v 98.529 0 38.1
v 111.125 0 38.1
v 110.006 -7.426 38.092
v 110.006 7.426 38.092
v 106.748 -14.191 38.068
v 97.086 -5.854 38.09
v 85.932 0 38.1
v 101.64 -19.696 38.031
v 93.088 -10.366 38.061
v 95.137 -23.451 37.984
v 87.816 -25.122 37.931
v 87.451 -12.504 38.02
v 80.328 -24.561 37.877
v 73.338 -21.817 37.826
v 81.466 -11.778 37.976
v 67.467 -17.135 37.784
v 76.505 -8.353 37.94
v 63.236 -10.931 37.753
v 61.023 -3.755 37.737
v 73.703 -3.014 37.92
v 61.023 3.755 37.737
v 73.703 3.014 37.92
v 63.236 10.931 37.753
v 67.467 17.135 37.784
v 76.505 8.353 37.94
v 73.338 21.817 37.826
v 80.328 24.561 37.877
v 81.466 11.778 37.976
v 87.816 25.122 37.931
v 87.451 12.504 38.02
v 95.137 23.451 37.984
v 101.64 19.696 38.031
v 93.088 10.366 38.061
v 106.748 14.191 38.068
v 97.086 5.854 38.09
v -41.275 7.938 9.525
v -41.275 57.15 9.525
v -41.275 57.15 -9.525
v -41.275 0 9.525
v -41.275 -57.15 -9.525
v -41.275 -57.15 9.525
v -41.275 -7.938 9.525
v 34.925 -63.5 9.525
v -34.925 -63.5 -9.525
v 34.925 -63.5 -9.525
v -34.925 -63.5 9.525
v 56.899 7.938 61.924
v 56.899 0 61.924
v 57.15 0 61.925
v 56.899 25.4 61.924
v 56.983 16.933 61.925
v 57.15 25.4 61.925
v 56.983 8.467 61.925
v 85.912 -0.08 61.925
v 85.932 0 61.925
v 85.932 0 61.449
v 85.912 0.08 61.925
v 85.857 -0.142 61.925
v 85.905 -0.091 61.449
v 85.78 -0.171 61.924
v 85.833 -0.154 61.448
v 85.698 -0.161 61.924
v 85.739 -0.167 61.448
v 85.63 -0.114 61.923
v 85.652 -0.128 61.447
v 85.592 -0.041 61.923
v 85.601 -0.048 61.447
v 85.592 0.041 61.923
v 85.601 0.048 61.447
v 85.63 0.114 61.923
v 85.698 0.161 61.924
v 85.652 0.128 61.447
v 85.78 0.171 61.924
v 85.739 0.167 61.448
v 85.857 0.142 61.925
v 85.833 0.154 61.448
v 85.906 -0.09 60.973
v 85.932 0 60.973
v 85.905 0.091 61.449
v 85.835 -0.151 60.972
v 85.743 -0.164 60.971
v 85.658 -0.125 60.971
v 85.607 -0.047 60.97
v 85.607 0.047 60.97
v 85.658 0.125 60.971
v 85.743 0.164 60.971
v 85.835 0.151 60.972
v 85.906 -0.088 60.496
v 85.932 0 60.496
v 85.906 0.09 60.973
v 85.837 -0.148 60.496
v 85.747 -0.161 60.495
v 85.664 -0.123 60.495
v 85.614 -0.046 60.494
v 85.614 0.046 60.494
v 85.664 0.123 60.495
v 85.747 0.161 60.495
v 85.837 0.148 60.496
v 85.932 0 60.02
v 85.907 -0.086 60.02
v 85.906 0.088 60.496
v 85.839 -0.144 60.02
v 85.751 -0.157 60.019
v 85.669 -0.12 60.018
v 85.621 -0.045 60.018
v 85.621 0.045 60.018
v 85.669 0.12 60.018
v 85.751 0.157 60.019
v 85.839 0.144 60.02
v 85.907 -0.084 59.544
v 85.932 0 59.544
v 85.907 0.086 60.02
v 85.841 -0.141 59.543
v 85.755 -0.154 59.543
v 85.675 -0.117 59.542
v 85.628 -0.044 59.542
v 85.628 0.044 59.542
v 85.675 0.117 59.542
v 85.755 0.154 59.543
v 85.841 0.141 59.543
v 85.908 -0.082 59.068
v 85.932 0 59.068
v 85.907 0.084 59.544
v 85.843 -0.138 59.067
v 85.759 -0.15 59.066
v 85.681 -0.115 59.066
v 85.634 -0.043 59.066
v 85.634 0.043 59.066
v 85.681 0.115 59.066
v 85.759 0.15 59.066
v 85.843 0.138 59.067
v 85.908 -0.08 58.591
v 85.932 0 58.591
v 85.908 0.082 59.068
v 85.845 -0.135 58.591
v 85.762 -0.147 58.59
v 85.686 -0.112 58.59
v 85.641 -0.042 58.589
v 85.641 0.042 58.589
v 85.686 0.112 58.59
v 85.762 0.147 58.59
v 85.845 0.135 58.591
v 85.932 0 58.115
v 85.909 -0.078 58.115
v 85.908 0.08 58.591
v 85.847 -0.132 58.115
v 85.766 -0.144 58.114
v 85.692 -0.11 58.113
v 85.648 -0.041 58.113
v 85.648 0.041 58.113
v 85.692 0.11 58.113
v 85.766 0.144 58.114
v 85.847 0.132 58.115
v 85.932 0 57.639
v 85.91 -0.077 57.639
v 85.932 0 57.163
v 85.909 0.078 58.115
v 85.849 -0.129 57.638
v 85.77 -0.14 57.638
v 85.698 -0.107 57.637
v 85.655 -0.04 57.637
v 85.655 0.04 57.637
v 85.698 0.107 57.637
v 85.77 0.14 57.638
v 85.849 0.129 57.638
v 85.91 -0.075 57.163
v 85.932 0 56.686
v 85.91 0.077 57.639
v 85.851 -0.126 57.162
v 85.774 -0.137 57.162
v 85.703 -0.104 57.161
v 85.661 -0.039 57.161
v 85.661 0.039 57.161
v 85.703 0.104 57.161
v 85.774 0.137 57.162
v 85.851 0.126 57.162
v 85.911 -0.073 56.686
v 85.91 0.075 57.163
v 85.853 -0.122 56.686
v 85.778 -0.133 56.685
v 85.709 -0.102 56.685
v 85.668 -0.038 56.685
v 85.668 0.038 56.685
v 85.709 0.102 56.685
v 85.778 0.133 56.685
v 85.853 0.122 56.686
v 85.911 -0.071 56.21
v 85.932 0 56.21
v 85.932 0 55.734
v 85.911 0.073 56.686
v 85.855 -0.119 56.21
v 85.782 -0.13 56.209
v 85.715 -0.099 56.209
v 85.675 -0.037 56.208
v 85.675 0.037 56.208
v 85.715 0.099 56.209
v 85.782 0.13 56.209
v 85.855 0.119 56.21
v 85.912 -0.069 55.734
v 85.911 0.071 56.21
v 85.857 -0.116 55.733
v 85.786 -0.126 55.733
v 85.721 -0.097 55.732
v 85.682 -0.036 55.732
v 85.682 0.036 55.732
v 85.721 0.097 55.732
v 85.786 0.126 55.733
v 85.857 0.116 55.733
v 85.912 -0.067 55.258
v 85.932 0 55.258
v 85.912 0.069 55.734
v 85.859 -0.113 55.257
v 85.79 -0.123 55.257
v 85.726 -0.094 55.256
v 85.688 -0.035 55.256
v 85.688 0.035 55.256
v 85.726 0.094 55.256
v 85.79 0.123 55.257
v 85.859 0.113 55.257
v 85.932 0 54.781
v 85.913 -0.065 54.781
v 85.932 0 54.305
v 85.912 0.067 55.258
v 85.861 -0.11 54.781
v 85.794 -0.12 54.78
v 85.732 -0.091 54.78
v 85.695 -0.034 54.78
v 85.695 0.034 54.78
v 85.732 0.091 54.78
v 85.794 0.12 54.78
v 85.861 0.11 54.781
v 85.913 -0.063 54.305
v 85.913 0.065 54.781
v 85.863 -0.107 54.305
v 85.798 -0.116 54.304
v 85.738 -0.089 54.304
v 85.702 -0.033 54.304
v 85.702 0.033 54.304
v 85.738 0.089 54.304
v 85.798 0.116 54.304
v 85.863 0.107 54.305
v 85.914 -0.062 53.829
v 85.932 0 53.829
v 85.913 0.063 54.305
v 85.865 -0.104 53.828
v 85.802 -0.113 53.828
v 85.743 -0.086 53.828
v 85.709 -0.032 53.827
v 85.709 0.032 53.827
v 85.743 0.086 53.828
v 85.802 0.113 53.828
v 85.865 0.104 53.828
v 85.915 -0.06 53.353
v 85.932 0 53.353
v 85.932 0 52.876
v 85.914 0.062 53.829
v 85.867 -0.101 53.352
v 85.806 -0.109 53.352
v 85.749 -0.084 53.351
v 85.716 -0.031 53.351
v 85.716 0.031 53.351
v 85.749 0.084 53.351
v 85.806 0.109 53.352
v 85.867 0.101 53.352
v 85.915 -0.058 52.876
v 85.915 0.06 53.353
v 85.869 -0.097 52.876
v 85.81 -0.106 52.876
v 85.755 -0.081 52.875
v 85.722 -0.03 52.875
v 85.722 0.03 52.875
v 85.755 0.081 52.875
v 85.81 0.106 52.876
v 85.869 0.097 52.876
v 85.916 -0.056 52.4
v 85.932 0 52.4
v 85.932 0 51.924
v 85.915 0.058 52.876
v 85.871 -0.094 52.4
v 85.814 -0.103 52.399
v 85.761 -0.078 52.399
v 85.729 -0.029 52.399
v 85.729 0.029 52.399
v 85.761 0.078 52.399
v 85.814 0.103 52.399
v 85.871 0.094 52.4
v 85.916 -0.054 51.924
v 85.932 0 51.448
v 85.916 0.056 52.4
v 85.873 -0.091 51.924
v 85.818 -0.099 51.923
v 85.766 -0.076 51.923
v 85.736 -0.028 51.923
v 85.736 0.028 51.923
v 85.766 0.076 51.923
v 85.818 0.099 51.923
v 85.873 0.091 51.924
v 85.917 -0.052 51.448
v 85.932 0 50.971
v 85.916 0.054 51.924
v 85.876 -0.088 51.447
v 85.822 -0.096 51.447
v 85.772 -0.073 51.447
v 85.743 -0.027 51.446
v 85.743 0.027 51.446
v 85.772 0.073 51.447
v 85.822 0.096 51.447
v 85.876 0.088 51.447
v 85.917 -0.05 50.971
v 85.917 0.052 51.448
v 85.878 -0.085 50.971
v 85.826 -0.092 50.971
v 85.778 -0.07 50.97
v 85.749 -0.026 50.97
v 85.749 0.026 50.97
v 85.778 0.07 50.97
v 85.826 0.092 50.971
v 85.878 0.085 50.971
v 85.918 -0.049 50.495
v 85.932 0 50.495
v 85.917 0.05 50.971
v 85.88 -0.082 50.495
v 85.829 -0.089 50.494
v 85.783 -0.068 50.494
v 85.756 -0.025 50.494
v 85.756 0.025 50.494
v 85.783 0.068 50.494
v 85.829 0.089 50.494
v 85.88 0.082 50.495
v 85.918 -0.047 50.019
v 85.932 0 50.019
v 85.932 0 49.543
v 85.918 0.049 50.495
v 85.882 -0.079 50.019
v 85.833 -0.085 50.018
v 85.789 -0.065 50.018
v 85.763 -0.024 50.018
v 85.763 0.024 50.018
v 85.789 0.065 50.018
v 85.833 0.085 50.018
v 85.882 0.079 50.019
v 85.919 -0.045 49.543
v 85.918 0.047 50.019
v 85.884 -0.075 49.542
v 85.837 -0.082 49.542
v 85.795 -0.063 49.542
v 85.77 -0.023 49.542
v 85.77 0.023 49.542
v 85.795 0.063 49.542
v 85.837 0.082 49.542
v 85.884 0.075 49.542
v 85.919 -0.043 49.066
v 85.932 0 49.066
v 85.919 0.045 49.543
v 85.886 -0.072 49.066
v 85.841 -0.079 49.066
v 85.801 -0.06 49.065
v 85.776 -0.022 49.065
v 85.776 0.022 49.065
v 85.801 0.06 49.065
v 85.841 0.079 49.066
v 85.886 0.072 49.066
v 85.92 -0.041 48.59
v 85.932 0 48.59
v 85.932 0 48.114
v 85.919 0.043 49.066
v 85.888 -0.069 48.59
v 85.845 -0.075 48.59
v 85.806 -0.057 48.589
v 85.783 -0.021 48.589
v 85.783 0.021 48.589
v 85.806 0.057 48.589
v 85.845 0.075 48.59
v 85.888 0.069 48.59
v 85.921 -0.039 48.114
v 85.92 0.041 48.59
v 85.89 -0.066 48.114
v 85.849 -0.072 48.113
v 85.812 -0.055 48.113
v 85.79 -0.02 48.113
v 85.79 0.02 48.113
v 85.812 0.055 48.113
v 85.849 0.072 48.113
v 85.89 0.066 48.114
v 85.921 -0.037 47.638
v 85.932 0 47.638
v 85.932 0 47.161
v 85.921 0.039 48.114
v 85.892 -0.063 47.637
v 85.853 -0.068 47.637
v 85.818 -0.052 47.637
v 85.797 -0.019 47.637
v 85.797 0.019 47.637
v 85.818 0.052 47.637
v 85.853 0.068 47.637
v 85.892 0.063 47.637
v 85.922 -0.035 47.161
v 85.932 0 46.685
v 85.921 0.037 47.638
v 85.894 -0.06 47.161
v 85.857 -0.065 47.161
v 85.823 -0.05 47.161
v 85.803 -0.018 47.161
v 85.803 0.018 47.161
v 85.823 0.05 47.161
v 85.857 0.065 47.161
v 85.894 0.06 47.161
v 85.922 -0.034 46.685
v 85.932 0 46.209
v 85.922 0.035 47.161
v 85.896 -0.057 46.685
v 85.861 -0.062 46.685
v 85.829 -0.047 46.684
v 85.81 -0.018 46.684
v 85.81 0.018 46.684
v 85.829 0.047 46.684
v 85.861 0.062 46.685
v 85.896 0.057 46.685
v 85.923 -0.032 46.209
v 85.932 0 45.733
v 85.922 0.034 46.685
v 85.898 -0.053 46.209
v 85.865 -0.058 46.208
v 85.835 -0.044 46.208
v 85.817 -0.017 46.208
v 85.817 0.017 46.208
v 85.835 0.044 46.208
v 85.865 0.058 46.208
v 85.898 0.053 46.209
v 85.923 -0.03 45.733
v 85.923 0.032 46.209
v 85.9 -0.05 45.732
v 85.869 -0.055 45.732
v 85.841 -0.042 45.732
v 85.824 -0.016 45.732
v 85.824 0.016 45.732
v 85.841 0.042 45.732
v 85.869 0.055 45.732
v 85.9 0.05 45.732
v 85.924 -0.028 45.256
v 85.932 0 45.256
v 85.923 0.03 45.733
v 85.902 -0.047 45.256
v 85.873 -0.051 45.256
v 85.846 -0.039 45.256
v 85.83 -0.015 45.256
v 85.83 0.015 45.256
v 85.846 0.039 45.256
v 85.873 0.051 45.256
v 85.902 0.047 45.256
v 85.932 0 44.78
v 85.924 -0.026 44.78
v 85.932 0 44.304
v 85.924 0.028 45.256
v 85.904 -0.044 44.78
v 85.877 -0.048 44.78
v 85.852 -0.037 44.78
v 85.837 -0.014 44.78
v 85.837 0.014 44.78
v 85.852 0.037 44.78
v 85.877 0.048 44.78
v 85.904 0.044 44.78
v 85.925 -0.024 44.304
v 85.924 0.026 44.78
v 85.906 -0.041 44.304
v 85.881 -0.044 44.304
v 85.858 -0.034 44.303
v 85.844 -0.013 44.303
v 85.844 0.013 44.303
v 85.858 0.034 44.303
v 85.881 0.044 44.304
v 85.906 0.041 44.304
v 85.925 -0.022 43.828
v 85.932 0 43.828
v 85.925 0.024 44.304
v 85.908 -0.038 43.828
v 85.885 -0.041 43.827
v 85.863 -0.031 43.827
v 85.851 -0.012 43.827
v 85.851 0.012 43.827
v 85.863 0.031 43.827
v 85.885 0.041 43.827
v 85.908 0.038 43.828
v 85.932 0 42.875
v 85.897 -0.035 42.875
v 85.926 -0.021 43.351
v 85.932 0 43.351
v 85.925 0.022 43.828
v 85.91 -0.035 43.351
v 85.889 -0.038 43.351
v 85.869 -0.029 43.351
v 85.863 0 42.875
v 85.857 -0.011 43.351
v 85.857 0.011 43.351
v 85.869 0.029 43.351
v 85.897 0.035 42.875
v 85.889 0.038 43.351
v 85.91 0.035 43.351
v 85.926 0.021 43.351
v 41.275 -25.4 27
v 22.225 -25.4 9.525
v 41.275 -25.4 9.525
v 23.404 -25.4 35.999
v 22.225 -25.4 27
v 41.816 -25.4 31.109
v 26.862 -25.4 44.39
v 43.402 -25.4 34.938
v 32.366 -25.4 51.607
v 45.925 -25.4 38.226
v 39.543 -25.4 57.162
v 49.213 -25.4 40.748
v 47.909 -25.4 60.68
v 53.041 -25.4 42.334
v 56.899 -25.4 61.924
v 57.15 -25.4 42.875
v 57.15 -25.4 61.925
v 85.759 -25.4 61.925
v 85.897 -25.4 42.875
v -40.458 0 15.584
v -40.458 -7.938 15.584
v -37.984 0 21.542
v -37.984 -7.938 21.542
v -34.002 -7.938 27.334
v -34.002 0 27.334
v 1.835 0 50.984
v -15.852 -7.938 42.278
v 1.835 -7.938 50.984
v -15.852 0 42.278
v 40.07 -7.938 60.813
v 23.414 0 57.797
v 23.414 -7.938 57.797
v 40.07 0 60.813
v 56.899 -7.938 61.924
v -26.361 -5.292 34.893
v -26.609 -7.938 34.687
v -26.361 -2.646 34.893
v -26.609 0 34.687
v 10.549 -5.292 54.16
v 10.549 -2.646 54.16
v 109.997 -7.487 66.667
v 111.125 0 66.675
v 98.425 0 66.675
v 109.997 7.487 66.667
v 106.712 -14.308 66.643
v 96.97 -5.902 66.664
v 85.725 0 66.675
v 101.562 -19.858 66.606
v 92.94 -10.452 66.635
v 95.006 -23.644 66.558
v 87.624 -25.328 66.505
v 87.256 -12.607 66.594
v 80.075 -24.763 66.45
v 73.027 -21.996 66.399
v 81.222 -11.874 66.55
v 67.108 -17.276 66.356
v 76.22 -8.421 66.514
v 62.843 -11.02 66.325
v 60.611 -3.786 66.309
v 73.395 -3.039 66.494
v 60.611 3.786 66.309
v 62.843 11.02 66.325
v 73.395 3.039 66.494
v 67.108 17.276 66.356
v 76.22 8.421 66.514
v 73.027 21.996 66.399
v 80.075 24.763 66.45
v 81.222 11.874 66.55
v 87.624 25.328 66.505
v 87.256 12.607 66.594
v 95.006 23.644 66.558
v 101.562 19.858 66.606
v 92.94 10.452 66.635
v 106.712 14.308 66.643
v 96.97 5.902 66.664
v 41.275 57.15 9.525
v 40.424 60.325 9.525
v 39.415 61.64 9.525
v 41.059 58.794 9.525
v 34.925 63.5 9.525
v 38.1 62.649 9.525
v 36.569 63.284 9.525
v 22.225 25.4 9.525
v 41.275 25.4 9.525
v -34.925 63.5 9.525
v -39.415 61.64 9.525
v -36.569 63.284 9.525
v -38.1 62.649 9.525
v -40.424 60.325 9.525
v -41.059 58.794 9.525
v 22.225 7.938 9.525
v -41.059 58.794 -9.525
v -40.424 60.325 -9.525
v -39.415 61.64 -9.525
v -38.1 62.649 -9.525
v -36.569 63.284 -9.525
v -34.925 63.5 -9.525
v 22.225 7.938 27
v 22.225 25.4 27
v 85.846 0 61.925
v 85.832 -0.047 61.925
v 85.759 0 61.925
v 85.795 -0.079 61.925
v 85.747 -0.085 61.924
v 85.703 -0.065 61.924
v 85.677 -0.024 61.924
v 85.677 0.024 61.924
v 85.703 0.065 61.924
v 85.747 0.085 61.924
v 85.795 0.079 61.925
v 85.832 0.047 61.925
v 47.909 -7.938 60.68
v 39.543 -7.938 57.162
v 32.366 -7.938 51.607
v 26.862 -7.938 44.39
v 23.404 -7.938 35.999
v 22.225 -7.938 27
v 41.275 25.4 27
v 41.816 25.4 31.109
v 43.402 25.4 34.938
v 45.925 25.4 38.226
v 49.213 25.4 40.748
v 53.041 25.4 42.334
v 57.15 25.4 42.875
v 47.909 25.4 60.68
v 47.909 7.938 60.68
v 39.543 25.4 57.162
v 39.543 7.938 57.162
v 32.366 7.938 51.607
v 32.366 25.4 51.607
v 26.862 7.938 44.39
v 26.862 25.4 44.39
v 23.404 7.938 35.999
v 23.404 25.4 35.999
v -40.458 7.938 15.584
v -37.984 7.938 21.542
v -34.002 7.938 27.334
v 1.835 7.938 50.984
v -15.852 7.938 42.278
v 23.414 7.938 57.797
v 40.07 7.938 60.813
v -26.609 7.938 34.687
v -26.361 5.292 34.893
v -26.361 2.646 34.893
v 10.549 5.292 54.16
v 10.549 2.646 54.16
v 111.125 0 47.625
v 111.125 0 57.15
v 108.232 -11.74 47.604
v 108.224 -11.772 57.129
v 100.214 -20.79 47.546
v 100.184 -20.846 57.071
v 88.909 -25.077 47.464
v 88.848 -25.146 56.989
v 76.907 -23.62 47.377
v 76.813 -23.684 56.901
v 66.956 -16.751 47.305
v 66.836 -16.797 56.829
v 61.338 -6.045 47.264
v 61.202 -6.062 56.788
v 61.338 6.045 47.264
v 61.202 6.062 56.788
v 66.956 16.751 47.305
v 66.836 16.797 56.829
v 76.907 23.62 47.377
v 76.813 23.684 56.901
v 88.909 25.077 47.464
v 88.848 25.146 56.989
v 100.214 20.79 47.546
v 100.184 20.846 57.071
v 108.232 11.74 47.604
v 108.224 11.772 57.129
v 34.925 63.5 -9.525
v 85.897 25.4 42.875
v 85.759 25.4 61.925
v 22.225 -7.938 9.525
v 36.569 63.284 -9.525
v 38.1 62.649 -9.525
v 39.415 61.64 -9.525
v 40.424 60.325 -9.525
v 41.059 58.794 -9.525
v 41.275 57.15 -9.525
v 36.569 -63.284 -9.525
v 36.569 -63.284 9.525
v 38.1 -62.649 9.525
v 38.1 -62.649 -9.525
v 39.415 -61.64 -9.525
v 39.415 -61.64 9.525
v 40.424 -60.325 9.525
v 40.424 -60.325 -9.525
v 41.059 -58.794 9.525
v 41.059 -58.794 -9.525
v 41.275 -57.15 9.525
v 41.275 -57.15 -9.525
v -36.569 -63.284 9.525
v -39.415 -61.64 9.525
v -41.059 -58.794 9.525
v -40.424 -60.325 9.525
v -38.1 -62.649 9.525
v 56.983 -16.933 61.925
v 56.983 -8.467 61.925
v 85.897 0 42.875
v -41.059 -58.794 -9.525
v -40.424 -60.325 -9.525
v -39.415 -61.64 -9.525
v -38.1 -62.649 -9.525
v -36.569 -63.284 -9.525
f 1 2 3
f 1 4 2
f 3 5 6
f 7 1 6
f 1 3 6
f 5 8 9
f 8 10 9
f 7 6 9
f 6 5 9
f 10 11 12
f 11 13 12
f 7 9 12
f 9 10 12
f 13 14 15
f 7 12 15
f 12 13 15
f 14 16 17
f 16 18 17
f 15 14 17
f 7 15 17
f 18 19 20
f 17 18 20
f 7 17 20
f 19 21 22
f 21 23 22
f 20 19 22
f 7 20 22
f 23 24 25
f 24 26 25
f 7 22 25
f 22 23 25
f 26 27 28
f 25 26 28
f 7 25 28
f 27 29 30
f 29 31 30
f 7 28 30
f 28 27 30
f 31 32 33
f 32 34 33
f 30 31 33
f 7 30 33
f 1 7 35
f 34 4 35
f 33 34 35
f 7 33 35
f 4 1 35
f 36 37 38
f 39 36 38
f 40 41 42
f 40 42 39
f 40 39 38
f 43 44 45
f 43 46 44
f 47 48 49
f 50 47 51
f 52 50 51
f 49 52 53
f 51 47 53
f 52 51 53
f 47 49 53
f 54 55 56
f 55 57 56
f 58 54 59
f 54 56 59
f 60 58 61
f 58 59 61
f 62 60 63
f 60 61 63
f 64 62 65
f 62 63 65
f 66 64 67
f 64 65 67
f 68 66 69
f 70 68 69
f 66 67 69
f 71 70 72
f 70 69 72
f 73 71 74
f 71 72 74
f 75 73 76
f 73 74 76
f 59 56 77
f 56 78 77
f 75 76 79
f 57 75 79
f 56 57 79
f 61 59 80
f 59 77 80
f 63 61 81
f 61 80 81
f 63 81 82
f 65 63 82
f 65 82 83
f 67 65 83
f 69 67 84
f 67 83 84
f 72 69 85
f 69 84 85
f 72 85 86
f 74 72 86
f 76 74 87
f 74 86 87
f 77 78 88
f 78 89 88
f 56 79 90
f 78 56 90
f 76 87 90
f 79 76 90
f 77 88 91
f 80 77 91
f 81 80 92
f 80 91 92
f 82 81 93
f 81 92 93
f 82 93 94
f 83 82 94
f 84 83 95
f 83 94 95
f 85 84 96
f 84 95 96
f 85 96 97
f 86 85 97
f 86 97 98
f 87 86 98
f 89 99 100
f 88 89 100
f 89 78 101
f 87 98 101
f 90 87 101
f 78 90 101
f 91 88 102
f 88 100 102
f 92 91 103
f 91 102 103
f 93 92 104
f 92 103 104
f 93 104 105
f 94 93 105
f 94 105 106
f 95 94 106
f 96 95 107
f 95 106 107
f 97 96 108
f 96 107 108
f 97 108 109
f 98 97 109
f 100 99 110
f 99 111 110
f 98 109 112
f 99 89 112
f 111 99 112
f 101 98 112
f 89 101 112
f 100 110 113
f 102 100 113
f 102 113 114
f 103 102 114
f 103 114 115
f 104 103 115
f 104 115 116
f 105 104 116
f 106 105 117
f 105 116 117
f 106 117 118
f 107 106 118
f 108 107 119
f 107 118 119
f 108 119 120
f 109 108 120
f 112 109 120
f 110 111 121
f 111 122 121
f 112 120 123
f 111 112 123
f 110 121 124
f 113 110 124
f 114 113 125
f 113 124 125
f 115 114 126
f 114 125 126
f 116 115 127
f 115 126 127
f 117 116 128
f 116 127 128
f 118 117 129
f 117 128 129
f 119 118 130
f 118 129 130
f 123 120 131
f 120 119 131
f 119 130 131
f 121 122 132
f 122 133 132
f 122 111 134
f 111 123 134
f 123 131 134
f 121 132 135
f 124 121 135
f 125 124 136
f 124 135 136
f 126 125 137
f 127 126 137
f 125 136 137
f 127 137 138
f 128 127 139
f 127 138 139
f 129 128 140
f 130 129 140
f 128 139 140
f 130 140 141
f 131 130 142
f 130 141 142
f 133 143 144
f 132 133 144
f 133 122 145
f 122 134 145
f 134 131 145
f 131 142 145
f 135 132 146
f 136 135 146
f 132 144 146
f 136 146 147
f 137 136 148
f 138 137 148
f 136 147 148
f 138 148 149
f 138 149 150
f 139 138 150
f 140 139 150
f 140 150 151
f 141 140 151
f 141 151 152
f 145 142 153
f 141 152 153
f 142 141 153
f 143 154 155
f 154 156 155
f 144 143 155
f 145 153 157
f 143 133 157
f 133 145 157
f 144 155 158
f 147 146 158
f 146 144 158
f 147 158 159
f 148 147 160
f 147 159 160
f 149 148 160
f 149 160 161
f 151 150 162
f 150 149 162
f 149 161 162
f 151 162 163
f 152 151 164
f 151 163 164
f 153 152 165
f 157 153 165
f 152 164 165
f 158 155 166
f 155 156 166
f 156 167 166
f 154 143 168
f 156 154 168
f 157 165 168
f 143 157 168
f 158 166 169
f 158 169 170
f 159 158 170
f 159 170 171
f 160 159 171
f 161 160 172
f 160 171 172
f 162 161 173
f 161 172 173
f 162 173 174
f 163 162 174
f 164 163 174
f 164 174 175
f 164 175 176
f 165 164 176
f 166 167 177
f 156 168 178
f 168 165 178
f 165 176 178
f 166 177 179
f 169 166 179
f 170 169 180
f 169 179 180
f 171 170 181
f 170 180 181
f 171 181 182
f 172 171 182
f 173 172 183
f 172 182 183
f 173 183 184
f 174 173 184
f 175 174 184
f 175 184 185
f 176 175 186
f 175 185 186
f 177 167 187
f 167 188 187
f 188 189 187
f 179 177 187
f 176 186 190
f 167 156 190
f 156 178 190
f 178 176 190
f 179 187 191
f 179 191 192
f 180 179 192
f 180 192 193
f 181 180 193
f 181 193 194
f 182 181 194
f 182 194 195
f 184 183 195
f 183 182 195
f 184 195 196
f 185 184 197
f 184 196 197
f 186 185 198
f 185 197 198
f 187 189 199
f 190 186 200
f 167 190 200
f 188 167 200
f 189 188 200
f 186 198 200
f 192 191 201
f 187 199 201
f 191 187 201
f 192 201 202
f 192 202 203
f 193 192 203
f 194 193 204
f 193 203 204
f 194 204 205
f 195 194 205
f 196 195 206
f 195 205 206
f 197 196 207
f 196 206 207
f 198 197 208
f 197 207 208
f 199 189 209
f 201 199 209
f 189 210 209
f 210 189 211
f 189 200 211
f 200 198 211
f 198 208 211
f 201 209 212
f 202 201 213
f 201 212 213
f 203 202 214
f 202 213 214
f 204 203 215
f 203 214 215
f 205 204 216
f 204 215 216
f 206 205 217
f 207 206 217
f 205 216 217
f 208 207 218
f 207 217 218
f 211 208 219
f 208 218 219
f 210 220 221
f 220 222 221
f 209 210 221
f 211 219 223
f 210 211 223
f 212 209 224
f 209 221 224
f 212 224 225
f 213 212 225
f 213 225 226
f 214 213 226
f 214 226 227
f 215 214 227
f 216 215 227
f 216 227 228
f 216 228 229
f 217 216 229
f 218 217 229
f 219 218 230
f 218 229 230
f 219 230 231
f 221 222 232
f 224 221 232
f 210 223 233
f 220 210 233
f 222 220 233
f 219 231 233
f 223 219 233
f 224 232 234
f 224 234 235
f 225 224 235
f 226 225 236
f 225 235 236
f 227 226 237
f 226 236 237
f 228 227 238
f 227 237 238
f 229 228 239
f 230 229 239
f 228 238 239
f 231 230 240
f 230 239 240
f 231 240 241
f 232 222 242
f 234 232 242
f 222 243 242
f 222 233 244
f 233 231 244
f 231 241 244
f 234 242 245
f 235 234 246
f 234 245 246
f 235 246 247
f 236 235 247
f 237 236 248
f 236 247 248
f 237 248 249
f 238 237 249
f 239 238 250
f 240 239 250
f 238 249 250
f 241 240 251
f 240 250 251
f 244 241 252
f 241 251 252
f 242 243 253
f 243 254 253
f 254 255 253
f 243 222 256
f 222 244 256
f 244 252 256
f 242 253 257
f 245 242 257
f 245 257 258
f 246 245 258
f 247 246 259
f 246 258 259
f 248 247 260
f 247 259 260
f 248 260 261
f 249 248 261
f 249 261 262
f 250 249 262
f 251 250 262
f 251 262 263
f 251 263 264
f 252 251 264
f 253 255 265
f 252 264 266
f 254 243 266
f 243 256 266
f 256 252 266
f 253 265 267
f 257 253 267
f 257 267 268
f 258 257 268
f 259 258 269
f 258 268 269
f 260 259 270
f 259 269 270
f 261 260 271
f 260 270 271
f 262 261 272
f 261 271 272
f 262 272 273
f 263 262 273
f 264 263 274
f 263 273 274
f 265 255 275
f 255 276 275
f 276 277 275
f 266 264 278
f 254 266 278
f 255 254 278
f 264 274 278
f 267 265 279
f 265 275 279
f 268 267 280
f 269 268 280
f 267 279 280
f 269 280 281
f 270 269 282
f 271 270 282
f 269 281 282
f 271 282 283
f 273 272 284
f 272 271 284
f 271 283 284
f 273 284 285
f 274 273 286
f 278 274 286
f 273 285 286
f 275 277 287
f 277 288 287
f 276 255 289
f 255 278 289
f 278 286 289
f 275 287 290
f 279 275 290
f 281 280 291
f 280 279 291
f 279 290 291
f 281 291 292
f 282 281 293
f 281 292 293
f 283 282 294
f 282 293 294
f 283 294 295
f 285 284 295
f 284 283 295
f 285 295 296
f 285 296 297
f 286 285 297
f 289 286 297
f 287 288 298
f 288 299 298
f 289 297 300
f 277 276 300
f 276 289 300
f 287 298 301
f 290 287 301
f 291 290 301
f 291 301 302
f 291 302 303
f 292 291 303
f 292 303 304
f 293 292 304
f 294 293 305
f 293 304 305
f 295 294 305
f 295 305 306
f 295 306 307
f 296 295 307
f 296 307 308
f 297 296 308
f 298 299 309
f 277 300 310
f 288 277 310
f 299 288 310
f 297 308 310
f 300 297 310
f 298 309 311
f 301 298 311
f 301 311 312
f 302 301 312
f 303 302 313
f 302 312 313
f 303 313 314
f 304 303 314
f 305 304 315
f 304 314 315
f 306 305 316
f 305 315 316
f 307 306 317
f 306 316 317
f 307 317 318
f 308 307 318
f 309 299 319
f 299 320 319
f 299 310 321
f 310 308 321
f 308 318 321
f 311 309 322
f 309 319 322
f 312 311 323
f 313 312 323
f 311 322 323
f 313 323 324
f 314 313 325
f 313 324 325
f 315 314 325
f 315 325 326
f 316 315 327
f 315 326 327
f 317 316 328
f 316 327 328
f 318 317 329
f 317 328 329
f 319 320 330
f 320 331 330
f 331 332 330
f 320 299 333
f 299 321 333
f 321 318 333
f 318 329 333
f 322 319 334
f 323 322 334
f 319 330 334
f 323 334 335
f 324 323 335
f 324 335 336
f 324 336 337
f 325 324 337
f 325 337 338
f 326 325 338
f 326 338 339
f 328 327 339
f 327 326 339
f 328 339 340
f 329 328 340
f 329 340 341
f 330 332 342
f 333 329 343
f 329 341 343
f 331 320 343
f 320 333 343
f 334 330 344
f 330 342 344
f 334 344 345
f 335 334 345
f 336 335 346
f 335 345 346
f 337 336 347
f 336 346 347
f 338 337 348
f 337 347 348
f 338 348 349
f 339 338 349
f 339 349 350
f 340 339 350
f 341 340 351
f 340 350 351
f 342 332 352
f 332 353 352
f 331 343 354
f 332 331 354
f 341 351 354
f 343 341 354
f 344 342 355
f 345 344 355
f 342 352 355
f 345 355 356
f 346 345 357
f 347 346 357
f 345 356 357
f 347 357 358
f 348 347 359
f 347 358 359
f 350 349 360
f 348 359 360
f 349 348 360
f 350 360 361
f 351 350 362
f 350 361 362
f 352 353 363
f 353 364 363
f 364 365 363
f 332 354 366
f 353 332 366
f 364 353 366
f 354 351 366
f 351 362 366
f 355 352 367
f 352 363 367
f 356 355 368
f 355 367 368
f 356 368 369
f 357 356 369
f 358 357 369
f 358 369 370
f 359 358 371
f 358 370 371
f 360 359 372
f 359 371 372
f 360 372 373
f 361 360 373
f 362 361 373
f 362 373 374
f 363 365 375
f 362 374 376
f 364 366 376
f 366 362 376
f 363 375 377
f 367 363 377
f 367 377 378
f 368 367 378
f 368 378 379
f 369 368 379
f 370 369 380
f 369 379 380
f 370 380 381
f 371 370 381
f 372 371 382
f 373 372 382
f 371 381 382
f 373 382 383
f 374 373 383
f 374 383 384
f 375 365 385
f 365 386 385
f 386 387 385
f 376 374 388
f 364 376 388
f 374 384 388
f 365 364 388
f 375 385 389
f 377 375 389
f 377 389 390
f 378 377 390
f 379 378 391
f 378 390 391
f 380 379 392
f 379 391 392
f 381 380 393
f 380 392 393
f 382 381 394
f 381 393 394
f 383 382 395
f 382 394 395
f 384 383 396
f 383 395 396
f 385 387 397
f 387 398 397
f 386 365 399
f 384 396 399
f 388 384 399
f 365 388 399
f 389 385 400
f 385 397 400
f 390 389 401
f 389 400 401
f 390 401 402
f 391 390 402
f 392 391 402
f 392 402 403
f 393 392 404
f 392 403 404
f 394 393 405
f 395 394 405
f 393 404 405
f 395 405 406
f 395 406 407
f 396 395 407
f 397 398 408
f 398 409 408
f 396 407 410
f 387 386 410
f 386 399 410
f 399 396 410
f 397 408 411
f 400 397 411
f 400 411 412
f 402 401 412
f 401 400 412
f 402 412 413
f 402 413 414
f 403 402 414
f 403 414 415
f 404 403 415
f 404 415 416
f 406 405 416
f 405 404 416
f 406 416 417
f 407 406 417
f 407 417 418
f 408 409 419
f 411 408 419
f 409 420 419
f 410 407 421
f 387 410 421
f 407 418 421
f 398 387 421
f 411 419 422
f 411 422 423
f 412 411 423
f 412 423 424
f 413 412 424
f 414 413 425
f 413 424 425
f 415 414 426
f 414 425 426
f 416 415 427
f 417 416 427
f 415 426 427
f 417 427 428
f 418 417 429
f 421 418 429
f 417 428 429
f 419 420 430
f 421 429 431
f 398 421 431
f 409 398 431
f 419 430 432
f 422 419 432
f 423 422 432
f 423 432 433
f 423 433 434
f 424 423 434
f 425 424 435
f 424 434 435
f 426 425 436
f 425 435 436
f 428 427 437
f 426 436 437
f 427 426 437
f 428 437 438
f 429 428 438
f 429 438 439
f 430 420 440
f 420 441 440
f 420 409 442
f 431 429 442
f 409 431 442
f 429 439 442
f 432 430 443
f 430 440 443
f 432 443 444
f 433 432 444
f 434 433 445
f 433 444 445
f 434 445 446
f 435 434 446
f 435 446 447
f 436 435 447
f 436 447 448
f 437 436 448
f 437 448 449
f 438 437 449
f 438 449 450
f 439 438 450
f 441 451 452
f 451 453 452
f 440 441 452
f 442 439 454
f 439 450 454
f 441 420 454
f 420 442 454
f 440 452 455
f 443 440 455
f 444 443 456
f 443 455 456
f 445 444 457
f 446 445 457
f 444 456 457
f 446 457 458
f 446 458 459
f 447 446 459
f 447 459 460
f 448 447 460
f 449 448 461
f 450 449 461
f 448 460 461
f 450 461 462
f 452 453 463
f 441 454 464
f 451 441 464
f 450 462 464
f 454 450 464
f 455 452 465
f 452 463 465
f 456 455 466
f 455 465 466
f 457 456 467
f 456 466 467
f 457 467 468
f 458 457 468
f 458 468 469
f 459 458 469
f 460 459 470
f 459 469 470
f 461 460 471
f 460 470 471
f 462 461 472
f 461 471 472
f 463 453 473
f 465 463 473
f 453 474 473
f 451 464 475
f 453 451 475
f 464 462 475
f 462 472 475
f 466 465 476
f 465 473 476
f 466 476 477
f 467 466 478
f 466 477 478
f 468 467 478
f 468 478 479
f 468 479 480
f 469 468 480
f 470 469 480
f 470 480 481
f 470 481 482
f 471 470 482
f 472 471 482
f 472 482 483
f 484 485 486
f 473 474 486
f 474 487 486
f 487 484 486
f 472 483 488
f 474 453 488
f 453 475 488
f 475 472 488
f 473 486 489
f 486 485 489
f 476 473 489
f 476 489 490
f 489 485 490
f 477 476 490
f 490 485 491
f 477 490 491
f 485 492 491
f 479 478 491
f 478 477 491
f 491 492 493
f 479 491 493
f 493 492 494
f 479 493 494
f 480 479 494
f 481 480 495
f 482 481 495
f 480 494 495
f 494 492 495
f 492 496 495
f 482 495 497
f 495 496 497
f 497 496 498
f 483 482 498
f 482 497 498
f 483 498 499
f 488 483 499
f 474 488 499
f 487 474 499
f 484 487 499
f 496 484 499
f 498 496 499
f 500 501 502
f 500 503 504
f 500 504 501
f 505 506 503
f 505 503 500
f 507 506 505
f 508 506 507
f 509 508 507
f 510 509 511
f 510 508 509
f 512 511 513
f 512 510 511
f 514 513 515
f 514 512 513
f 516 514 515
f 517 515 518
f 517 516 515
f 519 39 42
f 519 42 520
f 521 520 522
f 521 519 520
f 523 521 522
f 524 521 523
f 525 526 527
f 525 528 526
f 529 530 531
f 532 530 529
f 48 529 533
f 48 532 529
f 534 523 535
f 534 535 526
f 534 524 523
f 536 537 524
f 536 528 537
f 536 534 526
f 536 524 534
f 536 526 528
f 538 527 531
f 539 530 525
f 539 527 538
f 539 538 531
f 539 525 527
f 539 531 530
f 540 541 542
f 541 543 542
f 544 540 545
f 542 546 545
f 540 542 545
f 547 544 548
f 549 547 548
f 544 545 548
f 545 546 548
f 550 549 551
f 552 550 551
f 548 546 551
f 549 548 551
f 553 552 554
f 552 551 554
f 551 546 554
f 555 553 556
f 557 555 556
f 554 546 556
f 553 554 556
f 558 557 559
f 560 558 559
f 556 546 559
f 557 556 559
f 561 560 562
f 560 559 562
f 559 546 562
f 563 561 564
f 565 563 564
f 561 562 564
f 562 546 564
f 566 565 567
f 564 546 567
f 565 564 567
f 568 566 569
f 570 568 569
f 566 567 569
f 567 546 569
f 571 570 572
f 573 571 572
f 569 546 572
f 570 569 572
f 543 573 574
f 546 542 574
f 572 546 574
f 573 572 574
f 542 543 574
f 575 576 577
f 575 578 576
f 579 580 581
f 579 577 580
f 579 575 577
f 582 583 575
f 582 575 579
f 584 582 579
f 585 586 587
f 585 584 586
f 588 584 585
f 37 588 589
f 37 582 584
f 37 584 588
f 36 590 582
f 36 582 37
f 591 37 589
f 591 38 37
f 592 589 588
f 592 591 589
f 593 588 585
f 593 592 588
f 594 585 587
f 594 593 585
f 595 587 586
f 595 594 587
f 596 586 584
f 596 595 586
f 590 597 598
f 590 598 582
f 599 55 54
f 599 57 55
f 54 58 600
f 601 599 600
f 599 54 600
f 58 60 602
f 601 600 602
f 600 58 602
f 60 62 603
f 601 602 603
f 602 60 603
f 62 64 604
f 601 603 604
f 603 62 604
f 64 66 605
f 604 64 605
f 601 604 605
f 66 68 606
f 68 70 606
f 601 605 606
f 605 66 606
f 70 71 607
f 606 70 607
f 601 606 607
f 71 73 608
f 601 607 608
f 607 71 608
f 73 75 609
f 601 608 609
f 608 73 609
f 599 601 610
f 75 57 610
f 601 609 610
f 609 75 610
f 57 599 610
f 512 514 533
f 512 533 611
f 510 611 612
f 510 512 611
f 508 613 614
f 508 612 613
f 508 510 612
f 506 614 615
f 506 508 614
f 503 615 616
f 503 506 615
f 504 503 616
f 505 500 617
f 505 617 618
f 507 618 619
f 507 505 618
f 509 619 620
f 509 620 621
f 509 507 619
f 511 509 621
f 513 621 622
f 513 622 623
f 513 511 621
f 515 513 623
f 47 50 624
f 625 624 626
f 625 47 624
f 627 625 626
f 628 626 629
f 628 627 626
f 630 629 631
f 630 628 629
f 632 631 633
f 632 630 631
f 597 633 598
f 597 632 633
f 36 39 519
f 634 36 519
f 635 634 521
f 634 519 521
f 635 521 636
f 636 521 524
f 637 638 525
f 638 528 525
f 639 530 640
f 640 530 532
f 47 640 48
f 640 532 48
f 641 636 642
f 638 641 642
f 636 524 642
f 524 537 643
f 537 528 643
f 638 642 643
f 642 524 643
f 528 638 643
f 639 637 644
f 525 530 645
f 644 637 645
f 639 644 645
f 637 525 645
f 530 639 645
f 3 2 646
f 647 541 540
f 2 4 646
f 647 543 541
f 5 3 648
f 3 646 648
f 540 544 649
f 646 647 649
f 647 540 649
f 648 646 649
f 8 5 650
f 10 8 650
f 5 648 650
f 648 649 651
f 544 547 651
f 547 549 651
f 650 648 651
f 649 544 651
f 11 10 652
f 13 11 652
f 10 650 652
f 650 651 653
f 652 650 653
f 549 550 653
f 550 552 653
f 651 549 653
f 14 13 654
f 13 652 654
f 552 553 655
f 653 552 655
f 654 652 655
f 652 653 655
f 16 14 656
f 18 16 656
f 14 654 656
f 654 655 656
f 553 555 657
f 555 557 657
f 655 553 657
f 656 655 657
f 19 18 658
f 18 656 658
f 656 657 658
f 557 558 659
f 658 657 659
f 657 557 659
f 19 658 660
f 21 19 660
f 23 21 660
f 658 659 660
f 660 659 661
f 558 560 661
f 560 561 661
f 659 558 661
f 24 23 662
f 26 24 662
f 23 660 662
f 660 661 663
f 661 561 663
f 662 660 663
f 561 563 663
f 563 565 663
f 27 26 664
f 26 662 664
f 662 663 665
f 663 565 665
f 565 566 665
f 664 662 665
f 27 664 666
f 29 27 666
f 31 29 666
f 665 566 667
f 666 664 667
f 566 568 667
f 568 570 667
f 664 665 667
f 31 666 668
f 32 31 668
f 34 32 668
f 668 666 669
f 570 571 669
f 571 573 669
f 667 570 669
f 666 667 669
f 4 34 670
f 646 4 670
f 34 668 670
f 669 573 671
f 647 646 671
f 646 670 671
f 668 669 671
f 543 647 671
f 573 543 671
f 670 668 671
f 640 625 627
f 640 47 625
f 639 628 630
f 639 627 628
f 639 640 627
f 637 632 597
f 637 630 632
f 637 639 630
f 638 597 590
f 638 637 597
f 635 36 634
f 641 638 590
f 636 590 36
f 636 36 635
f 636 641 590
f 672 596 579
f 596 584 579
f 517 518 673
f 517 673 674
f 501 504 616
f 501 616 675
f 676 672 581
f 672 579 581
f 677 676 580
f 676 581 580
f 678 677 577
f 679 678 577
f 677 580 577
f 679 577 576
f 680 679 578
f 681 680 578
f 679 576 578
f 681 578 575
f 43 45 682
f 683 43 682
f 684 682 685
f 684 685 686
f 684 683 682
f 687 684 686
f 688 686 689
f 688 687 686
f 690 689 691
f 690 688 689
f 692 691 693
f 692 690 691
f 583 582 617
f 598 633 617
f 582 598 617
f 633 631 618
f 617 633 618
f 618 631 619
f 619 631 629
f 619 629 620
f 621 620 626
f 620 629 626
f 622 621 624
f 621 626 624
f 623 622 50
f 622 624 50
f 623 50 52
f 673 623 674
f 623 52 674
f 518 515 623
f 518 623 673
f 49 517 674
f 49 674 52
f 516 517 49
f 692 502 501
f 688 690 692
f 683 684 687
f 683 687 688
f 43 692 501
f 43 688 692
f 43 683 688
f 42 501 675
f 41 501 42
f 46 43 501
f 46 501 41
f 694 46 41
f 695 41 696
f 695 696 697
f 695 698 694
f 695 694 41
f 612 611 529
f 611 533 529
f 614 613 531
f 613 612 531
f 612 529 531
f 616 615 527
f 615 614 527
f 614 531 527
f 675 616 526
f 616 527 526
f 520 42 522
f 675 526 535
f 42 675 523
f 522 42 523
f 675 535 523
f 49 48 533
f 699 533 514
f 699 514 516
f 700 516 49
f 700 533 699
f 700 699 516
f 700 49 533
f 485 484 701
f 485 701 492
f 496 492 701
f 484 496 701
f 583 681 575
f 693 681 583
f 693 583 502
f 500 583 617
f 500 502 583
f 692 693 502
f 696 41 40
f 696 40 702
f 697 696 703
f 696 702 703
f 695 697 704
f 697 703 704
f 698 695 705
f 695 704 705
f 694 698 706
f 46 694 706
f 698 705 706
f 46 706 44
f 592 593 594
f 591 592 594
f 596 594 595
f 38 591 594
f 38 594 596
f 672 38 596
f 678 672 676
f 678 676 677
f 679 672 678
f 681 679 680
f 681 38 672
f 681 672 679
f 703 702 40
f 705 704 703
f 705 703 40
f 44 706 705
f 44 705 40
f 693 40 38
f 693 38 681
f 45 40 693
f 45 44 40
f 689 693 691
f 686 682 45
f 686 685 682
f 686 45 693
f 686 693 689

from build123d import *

# Parameters (mm, degrees)
F1_DEPTH = 63.5
F2_DEPTH = 25.4
F3_DEPTH = 7.9375
F5_R     = 6.35


with BuildPart() as f1:
    # F0 (on Front) → F1 (new body, symmetric)
    with BuildSketch(Plane.XZ):
        Polygon((-41.275, -9.525), (41.275, -9.525), (41.275, 9.525), (22.225, 9.525), (-41.275, 9.525), align=None)
    extrude(amount=F1_DEPTH, both=True)

    # F0 (on Front) → F2 (join, symmetric)
    with BuildSketch(Plane.XZ):
        with BuildLine():
            Line((22.225, 9.525), (41.275, 9.525))
            Line((41.275, 9.525), (41.275, 27.0002))
            ThreePointArc((41.275, 27.0002), (45.9246798487, 38.2255201513), (57.15, 42.8752))
            Line((57.15, 42.8752), (60.325, 42.8752))
            Line((60.325, 42.8752), (60.325, 61.9252))
            Line((60.325, 61.9252), (57.15, 61.9252))
            add(Edge.make_bspline(
                [(56.8991336297, 61.9242990015), (56.9827707325, 61.9246800592), (57.0663929629, 61.924980438), (57.15, 61.9252)],
                knots=[111.305979744, 111.305979744, 111.305979744, 111.305979744, 111.5045361635, 111.5045361635, 111.5045361635, 111.5045361635], degree=3))
            ThreePointArc((56.8991336297, 61.9242990015), (32.3657597153, 51.607049829), (22.225, 27.0002))
            Line((22.225, 27.0002), (22.225, 9.525))
        make_face()
        Polygon((60.325, 61.9252), (60.325, 42.8752), (85.8974464586, 42.8752), (85.7594156753, 61.9252), align=None)
    extrude(amount=F2_DEPTH, both=True)

    # F0 (on Front) → F3 (join, symmetric)
    with BuildSketch(Plane.XZ):
        with BuildLine():
            add(Edge.make_bspline(
                [(-41.275, 9.525), (-41.5444001407, 36.1441011448), (10.0141742032, 61.710687173), (56.8991336297, 61.9242990015)],
                knots=[0, 0, 0, 0, 111.305979744, 111.305979744, 111.305979744, 111.305979744], degree=3))
            Line((-41.275, 9.525), (22.225, 9.525))
            Line((22.225, 9.525), (22.225, 27.0002))
            ThreePointArc((22.225, 27.0002), (32.3657597153, 51.607049829), (56.8991336297, 61.9242990015))
        make_face()
    extrude(amount=F3_DEPTH, both=True)

    # F5
    f5_edges = [f1.edges().sort_by_distance(p)[0] for p in [
        (41.275, 63.5, 0),
        (-41.275, 63.5, 0),
        (-41.275, -63.5, 0),
        (41.275, -63.5, 0),
    ]]
    fillet(f5_edges, radius=F5_R)


with BuildPart() as f4:
    # F0 (on Front) → F4 (revolve)
    with BuildSketch(Plane.XZ):
        Polygon((85.932046175, 42.8752), (85.8974464586, 42.8752), (85.932046175, 38.1), (111.125, 38.1), (111.125, 66.675), (85.725, 66.675), (85.7594156753, 61.9252), (85.932046175, 61.9252), align=None)
    revolve(axis=Axis((85.8285230875, 0, 52.3875), (0.0072455202, 0, -0.9999737509)))


solid = Compound([f1.part, f4.part])
